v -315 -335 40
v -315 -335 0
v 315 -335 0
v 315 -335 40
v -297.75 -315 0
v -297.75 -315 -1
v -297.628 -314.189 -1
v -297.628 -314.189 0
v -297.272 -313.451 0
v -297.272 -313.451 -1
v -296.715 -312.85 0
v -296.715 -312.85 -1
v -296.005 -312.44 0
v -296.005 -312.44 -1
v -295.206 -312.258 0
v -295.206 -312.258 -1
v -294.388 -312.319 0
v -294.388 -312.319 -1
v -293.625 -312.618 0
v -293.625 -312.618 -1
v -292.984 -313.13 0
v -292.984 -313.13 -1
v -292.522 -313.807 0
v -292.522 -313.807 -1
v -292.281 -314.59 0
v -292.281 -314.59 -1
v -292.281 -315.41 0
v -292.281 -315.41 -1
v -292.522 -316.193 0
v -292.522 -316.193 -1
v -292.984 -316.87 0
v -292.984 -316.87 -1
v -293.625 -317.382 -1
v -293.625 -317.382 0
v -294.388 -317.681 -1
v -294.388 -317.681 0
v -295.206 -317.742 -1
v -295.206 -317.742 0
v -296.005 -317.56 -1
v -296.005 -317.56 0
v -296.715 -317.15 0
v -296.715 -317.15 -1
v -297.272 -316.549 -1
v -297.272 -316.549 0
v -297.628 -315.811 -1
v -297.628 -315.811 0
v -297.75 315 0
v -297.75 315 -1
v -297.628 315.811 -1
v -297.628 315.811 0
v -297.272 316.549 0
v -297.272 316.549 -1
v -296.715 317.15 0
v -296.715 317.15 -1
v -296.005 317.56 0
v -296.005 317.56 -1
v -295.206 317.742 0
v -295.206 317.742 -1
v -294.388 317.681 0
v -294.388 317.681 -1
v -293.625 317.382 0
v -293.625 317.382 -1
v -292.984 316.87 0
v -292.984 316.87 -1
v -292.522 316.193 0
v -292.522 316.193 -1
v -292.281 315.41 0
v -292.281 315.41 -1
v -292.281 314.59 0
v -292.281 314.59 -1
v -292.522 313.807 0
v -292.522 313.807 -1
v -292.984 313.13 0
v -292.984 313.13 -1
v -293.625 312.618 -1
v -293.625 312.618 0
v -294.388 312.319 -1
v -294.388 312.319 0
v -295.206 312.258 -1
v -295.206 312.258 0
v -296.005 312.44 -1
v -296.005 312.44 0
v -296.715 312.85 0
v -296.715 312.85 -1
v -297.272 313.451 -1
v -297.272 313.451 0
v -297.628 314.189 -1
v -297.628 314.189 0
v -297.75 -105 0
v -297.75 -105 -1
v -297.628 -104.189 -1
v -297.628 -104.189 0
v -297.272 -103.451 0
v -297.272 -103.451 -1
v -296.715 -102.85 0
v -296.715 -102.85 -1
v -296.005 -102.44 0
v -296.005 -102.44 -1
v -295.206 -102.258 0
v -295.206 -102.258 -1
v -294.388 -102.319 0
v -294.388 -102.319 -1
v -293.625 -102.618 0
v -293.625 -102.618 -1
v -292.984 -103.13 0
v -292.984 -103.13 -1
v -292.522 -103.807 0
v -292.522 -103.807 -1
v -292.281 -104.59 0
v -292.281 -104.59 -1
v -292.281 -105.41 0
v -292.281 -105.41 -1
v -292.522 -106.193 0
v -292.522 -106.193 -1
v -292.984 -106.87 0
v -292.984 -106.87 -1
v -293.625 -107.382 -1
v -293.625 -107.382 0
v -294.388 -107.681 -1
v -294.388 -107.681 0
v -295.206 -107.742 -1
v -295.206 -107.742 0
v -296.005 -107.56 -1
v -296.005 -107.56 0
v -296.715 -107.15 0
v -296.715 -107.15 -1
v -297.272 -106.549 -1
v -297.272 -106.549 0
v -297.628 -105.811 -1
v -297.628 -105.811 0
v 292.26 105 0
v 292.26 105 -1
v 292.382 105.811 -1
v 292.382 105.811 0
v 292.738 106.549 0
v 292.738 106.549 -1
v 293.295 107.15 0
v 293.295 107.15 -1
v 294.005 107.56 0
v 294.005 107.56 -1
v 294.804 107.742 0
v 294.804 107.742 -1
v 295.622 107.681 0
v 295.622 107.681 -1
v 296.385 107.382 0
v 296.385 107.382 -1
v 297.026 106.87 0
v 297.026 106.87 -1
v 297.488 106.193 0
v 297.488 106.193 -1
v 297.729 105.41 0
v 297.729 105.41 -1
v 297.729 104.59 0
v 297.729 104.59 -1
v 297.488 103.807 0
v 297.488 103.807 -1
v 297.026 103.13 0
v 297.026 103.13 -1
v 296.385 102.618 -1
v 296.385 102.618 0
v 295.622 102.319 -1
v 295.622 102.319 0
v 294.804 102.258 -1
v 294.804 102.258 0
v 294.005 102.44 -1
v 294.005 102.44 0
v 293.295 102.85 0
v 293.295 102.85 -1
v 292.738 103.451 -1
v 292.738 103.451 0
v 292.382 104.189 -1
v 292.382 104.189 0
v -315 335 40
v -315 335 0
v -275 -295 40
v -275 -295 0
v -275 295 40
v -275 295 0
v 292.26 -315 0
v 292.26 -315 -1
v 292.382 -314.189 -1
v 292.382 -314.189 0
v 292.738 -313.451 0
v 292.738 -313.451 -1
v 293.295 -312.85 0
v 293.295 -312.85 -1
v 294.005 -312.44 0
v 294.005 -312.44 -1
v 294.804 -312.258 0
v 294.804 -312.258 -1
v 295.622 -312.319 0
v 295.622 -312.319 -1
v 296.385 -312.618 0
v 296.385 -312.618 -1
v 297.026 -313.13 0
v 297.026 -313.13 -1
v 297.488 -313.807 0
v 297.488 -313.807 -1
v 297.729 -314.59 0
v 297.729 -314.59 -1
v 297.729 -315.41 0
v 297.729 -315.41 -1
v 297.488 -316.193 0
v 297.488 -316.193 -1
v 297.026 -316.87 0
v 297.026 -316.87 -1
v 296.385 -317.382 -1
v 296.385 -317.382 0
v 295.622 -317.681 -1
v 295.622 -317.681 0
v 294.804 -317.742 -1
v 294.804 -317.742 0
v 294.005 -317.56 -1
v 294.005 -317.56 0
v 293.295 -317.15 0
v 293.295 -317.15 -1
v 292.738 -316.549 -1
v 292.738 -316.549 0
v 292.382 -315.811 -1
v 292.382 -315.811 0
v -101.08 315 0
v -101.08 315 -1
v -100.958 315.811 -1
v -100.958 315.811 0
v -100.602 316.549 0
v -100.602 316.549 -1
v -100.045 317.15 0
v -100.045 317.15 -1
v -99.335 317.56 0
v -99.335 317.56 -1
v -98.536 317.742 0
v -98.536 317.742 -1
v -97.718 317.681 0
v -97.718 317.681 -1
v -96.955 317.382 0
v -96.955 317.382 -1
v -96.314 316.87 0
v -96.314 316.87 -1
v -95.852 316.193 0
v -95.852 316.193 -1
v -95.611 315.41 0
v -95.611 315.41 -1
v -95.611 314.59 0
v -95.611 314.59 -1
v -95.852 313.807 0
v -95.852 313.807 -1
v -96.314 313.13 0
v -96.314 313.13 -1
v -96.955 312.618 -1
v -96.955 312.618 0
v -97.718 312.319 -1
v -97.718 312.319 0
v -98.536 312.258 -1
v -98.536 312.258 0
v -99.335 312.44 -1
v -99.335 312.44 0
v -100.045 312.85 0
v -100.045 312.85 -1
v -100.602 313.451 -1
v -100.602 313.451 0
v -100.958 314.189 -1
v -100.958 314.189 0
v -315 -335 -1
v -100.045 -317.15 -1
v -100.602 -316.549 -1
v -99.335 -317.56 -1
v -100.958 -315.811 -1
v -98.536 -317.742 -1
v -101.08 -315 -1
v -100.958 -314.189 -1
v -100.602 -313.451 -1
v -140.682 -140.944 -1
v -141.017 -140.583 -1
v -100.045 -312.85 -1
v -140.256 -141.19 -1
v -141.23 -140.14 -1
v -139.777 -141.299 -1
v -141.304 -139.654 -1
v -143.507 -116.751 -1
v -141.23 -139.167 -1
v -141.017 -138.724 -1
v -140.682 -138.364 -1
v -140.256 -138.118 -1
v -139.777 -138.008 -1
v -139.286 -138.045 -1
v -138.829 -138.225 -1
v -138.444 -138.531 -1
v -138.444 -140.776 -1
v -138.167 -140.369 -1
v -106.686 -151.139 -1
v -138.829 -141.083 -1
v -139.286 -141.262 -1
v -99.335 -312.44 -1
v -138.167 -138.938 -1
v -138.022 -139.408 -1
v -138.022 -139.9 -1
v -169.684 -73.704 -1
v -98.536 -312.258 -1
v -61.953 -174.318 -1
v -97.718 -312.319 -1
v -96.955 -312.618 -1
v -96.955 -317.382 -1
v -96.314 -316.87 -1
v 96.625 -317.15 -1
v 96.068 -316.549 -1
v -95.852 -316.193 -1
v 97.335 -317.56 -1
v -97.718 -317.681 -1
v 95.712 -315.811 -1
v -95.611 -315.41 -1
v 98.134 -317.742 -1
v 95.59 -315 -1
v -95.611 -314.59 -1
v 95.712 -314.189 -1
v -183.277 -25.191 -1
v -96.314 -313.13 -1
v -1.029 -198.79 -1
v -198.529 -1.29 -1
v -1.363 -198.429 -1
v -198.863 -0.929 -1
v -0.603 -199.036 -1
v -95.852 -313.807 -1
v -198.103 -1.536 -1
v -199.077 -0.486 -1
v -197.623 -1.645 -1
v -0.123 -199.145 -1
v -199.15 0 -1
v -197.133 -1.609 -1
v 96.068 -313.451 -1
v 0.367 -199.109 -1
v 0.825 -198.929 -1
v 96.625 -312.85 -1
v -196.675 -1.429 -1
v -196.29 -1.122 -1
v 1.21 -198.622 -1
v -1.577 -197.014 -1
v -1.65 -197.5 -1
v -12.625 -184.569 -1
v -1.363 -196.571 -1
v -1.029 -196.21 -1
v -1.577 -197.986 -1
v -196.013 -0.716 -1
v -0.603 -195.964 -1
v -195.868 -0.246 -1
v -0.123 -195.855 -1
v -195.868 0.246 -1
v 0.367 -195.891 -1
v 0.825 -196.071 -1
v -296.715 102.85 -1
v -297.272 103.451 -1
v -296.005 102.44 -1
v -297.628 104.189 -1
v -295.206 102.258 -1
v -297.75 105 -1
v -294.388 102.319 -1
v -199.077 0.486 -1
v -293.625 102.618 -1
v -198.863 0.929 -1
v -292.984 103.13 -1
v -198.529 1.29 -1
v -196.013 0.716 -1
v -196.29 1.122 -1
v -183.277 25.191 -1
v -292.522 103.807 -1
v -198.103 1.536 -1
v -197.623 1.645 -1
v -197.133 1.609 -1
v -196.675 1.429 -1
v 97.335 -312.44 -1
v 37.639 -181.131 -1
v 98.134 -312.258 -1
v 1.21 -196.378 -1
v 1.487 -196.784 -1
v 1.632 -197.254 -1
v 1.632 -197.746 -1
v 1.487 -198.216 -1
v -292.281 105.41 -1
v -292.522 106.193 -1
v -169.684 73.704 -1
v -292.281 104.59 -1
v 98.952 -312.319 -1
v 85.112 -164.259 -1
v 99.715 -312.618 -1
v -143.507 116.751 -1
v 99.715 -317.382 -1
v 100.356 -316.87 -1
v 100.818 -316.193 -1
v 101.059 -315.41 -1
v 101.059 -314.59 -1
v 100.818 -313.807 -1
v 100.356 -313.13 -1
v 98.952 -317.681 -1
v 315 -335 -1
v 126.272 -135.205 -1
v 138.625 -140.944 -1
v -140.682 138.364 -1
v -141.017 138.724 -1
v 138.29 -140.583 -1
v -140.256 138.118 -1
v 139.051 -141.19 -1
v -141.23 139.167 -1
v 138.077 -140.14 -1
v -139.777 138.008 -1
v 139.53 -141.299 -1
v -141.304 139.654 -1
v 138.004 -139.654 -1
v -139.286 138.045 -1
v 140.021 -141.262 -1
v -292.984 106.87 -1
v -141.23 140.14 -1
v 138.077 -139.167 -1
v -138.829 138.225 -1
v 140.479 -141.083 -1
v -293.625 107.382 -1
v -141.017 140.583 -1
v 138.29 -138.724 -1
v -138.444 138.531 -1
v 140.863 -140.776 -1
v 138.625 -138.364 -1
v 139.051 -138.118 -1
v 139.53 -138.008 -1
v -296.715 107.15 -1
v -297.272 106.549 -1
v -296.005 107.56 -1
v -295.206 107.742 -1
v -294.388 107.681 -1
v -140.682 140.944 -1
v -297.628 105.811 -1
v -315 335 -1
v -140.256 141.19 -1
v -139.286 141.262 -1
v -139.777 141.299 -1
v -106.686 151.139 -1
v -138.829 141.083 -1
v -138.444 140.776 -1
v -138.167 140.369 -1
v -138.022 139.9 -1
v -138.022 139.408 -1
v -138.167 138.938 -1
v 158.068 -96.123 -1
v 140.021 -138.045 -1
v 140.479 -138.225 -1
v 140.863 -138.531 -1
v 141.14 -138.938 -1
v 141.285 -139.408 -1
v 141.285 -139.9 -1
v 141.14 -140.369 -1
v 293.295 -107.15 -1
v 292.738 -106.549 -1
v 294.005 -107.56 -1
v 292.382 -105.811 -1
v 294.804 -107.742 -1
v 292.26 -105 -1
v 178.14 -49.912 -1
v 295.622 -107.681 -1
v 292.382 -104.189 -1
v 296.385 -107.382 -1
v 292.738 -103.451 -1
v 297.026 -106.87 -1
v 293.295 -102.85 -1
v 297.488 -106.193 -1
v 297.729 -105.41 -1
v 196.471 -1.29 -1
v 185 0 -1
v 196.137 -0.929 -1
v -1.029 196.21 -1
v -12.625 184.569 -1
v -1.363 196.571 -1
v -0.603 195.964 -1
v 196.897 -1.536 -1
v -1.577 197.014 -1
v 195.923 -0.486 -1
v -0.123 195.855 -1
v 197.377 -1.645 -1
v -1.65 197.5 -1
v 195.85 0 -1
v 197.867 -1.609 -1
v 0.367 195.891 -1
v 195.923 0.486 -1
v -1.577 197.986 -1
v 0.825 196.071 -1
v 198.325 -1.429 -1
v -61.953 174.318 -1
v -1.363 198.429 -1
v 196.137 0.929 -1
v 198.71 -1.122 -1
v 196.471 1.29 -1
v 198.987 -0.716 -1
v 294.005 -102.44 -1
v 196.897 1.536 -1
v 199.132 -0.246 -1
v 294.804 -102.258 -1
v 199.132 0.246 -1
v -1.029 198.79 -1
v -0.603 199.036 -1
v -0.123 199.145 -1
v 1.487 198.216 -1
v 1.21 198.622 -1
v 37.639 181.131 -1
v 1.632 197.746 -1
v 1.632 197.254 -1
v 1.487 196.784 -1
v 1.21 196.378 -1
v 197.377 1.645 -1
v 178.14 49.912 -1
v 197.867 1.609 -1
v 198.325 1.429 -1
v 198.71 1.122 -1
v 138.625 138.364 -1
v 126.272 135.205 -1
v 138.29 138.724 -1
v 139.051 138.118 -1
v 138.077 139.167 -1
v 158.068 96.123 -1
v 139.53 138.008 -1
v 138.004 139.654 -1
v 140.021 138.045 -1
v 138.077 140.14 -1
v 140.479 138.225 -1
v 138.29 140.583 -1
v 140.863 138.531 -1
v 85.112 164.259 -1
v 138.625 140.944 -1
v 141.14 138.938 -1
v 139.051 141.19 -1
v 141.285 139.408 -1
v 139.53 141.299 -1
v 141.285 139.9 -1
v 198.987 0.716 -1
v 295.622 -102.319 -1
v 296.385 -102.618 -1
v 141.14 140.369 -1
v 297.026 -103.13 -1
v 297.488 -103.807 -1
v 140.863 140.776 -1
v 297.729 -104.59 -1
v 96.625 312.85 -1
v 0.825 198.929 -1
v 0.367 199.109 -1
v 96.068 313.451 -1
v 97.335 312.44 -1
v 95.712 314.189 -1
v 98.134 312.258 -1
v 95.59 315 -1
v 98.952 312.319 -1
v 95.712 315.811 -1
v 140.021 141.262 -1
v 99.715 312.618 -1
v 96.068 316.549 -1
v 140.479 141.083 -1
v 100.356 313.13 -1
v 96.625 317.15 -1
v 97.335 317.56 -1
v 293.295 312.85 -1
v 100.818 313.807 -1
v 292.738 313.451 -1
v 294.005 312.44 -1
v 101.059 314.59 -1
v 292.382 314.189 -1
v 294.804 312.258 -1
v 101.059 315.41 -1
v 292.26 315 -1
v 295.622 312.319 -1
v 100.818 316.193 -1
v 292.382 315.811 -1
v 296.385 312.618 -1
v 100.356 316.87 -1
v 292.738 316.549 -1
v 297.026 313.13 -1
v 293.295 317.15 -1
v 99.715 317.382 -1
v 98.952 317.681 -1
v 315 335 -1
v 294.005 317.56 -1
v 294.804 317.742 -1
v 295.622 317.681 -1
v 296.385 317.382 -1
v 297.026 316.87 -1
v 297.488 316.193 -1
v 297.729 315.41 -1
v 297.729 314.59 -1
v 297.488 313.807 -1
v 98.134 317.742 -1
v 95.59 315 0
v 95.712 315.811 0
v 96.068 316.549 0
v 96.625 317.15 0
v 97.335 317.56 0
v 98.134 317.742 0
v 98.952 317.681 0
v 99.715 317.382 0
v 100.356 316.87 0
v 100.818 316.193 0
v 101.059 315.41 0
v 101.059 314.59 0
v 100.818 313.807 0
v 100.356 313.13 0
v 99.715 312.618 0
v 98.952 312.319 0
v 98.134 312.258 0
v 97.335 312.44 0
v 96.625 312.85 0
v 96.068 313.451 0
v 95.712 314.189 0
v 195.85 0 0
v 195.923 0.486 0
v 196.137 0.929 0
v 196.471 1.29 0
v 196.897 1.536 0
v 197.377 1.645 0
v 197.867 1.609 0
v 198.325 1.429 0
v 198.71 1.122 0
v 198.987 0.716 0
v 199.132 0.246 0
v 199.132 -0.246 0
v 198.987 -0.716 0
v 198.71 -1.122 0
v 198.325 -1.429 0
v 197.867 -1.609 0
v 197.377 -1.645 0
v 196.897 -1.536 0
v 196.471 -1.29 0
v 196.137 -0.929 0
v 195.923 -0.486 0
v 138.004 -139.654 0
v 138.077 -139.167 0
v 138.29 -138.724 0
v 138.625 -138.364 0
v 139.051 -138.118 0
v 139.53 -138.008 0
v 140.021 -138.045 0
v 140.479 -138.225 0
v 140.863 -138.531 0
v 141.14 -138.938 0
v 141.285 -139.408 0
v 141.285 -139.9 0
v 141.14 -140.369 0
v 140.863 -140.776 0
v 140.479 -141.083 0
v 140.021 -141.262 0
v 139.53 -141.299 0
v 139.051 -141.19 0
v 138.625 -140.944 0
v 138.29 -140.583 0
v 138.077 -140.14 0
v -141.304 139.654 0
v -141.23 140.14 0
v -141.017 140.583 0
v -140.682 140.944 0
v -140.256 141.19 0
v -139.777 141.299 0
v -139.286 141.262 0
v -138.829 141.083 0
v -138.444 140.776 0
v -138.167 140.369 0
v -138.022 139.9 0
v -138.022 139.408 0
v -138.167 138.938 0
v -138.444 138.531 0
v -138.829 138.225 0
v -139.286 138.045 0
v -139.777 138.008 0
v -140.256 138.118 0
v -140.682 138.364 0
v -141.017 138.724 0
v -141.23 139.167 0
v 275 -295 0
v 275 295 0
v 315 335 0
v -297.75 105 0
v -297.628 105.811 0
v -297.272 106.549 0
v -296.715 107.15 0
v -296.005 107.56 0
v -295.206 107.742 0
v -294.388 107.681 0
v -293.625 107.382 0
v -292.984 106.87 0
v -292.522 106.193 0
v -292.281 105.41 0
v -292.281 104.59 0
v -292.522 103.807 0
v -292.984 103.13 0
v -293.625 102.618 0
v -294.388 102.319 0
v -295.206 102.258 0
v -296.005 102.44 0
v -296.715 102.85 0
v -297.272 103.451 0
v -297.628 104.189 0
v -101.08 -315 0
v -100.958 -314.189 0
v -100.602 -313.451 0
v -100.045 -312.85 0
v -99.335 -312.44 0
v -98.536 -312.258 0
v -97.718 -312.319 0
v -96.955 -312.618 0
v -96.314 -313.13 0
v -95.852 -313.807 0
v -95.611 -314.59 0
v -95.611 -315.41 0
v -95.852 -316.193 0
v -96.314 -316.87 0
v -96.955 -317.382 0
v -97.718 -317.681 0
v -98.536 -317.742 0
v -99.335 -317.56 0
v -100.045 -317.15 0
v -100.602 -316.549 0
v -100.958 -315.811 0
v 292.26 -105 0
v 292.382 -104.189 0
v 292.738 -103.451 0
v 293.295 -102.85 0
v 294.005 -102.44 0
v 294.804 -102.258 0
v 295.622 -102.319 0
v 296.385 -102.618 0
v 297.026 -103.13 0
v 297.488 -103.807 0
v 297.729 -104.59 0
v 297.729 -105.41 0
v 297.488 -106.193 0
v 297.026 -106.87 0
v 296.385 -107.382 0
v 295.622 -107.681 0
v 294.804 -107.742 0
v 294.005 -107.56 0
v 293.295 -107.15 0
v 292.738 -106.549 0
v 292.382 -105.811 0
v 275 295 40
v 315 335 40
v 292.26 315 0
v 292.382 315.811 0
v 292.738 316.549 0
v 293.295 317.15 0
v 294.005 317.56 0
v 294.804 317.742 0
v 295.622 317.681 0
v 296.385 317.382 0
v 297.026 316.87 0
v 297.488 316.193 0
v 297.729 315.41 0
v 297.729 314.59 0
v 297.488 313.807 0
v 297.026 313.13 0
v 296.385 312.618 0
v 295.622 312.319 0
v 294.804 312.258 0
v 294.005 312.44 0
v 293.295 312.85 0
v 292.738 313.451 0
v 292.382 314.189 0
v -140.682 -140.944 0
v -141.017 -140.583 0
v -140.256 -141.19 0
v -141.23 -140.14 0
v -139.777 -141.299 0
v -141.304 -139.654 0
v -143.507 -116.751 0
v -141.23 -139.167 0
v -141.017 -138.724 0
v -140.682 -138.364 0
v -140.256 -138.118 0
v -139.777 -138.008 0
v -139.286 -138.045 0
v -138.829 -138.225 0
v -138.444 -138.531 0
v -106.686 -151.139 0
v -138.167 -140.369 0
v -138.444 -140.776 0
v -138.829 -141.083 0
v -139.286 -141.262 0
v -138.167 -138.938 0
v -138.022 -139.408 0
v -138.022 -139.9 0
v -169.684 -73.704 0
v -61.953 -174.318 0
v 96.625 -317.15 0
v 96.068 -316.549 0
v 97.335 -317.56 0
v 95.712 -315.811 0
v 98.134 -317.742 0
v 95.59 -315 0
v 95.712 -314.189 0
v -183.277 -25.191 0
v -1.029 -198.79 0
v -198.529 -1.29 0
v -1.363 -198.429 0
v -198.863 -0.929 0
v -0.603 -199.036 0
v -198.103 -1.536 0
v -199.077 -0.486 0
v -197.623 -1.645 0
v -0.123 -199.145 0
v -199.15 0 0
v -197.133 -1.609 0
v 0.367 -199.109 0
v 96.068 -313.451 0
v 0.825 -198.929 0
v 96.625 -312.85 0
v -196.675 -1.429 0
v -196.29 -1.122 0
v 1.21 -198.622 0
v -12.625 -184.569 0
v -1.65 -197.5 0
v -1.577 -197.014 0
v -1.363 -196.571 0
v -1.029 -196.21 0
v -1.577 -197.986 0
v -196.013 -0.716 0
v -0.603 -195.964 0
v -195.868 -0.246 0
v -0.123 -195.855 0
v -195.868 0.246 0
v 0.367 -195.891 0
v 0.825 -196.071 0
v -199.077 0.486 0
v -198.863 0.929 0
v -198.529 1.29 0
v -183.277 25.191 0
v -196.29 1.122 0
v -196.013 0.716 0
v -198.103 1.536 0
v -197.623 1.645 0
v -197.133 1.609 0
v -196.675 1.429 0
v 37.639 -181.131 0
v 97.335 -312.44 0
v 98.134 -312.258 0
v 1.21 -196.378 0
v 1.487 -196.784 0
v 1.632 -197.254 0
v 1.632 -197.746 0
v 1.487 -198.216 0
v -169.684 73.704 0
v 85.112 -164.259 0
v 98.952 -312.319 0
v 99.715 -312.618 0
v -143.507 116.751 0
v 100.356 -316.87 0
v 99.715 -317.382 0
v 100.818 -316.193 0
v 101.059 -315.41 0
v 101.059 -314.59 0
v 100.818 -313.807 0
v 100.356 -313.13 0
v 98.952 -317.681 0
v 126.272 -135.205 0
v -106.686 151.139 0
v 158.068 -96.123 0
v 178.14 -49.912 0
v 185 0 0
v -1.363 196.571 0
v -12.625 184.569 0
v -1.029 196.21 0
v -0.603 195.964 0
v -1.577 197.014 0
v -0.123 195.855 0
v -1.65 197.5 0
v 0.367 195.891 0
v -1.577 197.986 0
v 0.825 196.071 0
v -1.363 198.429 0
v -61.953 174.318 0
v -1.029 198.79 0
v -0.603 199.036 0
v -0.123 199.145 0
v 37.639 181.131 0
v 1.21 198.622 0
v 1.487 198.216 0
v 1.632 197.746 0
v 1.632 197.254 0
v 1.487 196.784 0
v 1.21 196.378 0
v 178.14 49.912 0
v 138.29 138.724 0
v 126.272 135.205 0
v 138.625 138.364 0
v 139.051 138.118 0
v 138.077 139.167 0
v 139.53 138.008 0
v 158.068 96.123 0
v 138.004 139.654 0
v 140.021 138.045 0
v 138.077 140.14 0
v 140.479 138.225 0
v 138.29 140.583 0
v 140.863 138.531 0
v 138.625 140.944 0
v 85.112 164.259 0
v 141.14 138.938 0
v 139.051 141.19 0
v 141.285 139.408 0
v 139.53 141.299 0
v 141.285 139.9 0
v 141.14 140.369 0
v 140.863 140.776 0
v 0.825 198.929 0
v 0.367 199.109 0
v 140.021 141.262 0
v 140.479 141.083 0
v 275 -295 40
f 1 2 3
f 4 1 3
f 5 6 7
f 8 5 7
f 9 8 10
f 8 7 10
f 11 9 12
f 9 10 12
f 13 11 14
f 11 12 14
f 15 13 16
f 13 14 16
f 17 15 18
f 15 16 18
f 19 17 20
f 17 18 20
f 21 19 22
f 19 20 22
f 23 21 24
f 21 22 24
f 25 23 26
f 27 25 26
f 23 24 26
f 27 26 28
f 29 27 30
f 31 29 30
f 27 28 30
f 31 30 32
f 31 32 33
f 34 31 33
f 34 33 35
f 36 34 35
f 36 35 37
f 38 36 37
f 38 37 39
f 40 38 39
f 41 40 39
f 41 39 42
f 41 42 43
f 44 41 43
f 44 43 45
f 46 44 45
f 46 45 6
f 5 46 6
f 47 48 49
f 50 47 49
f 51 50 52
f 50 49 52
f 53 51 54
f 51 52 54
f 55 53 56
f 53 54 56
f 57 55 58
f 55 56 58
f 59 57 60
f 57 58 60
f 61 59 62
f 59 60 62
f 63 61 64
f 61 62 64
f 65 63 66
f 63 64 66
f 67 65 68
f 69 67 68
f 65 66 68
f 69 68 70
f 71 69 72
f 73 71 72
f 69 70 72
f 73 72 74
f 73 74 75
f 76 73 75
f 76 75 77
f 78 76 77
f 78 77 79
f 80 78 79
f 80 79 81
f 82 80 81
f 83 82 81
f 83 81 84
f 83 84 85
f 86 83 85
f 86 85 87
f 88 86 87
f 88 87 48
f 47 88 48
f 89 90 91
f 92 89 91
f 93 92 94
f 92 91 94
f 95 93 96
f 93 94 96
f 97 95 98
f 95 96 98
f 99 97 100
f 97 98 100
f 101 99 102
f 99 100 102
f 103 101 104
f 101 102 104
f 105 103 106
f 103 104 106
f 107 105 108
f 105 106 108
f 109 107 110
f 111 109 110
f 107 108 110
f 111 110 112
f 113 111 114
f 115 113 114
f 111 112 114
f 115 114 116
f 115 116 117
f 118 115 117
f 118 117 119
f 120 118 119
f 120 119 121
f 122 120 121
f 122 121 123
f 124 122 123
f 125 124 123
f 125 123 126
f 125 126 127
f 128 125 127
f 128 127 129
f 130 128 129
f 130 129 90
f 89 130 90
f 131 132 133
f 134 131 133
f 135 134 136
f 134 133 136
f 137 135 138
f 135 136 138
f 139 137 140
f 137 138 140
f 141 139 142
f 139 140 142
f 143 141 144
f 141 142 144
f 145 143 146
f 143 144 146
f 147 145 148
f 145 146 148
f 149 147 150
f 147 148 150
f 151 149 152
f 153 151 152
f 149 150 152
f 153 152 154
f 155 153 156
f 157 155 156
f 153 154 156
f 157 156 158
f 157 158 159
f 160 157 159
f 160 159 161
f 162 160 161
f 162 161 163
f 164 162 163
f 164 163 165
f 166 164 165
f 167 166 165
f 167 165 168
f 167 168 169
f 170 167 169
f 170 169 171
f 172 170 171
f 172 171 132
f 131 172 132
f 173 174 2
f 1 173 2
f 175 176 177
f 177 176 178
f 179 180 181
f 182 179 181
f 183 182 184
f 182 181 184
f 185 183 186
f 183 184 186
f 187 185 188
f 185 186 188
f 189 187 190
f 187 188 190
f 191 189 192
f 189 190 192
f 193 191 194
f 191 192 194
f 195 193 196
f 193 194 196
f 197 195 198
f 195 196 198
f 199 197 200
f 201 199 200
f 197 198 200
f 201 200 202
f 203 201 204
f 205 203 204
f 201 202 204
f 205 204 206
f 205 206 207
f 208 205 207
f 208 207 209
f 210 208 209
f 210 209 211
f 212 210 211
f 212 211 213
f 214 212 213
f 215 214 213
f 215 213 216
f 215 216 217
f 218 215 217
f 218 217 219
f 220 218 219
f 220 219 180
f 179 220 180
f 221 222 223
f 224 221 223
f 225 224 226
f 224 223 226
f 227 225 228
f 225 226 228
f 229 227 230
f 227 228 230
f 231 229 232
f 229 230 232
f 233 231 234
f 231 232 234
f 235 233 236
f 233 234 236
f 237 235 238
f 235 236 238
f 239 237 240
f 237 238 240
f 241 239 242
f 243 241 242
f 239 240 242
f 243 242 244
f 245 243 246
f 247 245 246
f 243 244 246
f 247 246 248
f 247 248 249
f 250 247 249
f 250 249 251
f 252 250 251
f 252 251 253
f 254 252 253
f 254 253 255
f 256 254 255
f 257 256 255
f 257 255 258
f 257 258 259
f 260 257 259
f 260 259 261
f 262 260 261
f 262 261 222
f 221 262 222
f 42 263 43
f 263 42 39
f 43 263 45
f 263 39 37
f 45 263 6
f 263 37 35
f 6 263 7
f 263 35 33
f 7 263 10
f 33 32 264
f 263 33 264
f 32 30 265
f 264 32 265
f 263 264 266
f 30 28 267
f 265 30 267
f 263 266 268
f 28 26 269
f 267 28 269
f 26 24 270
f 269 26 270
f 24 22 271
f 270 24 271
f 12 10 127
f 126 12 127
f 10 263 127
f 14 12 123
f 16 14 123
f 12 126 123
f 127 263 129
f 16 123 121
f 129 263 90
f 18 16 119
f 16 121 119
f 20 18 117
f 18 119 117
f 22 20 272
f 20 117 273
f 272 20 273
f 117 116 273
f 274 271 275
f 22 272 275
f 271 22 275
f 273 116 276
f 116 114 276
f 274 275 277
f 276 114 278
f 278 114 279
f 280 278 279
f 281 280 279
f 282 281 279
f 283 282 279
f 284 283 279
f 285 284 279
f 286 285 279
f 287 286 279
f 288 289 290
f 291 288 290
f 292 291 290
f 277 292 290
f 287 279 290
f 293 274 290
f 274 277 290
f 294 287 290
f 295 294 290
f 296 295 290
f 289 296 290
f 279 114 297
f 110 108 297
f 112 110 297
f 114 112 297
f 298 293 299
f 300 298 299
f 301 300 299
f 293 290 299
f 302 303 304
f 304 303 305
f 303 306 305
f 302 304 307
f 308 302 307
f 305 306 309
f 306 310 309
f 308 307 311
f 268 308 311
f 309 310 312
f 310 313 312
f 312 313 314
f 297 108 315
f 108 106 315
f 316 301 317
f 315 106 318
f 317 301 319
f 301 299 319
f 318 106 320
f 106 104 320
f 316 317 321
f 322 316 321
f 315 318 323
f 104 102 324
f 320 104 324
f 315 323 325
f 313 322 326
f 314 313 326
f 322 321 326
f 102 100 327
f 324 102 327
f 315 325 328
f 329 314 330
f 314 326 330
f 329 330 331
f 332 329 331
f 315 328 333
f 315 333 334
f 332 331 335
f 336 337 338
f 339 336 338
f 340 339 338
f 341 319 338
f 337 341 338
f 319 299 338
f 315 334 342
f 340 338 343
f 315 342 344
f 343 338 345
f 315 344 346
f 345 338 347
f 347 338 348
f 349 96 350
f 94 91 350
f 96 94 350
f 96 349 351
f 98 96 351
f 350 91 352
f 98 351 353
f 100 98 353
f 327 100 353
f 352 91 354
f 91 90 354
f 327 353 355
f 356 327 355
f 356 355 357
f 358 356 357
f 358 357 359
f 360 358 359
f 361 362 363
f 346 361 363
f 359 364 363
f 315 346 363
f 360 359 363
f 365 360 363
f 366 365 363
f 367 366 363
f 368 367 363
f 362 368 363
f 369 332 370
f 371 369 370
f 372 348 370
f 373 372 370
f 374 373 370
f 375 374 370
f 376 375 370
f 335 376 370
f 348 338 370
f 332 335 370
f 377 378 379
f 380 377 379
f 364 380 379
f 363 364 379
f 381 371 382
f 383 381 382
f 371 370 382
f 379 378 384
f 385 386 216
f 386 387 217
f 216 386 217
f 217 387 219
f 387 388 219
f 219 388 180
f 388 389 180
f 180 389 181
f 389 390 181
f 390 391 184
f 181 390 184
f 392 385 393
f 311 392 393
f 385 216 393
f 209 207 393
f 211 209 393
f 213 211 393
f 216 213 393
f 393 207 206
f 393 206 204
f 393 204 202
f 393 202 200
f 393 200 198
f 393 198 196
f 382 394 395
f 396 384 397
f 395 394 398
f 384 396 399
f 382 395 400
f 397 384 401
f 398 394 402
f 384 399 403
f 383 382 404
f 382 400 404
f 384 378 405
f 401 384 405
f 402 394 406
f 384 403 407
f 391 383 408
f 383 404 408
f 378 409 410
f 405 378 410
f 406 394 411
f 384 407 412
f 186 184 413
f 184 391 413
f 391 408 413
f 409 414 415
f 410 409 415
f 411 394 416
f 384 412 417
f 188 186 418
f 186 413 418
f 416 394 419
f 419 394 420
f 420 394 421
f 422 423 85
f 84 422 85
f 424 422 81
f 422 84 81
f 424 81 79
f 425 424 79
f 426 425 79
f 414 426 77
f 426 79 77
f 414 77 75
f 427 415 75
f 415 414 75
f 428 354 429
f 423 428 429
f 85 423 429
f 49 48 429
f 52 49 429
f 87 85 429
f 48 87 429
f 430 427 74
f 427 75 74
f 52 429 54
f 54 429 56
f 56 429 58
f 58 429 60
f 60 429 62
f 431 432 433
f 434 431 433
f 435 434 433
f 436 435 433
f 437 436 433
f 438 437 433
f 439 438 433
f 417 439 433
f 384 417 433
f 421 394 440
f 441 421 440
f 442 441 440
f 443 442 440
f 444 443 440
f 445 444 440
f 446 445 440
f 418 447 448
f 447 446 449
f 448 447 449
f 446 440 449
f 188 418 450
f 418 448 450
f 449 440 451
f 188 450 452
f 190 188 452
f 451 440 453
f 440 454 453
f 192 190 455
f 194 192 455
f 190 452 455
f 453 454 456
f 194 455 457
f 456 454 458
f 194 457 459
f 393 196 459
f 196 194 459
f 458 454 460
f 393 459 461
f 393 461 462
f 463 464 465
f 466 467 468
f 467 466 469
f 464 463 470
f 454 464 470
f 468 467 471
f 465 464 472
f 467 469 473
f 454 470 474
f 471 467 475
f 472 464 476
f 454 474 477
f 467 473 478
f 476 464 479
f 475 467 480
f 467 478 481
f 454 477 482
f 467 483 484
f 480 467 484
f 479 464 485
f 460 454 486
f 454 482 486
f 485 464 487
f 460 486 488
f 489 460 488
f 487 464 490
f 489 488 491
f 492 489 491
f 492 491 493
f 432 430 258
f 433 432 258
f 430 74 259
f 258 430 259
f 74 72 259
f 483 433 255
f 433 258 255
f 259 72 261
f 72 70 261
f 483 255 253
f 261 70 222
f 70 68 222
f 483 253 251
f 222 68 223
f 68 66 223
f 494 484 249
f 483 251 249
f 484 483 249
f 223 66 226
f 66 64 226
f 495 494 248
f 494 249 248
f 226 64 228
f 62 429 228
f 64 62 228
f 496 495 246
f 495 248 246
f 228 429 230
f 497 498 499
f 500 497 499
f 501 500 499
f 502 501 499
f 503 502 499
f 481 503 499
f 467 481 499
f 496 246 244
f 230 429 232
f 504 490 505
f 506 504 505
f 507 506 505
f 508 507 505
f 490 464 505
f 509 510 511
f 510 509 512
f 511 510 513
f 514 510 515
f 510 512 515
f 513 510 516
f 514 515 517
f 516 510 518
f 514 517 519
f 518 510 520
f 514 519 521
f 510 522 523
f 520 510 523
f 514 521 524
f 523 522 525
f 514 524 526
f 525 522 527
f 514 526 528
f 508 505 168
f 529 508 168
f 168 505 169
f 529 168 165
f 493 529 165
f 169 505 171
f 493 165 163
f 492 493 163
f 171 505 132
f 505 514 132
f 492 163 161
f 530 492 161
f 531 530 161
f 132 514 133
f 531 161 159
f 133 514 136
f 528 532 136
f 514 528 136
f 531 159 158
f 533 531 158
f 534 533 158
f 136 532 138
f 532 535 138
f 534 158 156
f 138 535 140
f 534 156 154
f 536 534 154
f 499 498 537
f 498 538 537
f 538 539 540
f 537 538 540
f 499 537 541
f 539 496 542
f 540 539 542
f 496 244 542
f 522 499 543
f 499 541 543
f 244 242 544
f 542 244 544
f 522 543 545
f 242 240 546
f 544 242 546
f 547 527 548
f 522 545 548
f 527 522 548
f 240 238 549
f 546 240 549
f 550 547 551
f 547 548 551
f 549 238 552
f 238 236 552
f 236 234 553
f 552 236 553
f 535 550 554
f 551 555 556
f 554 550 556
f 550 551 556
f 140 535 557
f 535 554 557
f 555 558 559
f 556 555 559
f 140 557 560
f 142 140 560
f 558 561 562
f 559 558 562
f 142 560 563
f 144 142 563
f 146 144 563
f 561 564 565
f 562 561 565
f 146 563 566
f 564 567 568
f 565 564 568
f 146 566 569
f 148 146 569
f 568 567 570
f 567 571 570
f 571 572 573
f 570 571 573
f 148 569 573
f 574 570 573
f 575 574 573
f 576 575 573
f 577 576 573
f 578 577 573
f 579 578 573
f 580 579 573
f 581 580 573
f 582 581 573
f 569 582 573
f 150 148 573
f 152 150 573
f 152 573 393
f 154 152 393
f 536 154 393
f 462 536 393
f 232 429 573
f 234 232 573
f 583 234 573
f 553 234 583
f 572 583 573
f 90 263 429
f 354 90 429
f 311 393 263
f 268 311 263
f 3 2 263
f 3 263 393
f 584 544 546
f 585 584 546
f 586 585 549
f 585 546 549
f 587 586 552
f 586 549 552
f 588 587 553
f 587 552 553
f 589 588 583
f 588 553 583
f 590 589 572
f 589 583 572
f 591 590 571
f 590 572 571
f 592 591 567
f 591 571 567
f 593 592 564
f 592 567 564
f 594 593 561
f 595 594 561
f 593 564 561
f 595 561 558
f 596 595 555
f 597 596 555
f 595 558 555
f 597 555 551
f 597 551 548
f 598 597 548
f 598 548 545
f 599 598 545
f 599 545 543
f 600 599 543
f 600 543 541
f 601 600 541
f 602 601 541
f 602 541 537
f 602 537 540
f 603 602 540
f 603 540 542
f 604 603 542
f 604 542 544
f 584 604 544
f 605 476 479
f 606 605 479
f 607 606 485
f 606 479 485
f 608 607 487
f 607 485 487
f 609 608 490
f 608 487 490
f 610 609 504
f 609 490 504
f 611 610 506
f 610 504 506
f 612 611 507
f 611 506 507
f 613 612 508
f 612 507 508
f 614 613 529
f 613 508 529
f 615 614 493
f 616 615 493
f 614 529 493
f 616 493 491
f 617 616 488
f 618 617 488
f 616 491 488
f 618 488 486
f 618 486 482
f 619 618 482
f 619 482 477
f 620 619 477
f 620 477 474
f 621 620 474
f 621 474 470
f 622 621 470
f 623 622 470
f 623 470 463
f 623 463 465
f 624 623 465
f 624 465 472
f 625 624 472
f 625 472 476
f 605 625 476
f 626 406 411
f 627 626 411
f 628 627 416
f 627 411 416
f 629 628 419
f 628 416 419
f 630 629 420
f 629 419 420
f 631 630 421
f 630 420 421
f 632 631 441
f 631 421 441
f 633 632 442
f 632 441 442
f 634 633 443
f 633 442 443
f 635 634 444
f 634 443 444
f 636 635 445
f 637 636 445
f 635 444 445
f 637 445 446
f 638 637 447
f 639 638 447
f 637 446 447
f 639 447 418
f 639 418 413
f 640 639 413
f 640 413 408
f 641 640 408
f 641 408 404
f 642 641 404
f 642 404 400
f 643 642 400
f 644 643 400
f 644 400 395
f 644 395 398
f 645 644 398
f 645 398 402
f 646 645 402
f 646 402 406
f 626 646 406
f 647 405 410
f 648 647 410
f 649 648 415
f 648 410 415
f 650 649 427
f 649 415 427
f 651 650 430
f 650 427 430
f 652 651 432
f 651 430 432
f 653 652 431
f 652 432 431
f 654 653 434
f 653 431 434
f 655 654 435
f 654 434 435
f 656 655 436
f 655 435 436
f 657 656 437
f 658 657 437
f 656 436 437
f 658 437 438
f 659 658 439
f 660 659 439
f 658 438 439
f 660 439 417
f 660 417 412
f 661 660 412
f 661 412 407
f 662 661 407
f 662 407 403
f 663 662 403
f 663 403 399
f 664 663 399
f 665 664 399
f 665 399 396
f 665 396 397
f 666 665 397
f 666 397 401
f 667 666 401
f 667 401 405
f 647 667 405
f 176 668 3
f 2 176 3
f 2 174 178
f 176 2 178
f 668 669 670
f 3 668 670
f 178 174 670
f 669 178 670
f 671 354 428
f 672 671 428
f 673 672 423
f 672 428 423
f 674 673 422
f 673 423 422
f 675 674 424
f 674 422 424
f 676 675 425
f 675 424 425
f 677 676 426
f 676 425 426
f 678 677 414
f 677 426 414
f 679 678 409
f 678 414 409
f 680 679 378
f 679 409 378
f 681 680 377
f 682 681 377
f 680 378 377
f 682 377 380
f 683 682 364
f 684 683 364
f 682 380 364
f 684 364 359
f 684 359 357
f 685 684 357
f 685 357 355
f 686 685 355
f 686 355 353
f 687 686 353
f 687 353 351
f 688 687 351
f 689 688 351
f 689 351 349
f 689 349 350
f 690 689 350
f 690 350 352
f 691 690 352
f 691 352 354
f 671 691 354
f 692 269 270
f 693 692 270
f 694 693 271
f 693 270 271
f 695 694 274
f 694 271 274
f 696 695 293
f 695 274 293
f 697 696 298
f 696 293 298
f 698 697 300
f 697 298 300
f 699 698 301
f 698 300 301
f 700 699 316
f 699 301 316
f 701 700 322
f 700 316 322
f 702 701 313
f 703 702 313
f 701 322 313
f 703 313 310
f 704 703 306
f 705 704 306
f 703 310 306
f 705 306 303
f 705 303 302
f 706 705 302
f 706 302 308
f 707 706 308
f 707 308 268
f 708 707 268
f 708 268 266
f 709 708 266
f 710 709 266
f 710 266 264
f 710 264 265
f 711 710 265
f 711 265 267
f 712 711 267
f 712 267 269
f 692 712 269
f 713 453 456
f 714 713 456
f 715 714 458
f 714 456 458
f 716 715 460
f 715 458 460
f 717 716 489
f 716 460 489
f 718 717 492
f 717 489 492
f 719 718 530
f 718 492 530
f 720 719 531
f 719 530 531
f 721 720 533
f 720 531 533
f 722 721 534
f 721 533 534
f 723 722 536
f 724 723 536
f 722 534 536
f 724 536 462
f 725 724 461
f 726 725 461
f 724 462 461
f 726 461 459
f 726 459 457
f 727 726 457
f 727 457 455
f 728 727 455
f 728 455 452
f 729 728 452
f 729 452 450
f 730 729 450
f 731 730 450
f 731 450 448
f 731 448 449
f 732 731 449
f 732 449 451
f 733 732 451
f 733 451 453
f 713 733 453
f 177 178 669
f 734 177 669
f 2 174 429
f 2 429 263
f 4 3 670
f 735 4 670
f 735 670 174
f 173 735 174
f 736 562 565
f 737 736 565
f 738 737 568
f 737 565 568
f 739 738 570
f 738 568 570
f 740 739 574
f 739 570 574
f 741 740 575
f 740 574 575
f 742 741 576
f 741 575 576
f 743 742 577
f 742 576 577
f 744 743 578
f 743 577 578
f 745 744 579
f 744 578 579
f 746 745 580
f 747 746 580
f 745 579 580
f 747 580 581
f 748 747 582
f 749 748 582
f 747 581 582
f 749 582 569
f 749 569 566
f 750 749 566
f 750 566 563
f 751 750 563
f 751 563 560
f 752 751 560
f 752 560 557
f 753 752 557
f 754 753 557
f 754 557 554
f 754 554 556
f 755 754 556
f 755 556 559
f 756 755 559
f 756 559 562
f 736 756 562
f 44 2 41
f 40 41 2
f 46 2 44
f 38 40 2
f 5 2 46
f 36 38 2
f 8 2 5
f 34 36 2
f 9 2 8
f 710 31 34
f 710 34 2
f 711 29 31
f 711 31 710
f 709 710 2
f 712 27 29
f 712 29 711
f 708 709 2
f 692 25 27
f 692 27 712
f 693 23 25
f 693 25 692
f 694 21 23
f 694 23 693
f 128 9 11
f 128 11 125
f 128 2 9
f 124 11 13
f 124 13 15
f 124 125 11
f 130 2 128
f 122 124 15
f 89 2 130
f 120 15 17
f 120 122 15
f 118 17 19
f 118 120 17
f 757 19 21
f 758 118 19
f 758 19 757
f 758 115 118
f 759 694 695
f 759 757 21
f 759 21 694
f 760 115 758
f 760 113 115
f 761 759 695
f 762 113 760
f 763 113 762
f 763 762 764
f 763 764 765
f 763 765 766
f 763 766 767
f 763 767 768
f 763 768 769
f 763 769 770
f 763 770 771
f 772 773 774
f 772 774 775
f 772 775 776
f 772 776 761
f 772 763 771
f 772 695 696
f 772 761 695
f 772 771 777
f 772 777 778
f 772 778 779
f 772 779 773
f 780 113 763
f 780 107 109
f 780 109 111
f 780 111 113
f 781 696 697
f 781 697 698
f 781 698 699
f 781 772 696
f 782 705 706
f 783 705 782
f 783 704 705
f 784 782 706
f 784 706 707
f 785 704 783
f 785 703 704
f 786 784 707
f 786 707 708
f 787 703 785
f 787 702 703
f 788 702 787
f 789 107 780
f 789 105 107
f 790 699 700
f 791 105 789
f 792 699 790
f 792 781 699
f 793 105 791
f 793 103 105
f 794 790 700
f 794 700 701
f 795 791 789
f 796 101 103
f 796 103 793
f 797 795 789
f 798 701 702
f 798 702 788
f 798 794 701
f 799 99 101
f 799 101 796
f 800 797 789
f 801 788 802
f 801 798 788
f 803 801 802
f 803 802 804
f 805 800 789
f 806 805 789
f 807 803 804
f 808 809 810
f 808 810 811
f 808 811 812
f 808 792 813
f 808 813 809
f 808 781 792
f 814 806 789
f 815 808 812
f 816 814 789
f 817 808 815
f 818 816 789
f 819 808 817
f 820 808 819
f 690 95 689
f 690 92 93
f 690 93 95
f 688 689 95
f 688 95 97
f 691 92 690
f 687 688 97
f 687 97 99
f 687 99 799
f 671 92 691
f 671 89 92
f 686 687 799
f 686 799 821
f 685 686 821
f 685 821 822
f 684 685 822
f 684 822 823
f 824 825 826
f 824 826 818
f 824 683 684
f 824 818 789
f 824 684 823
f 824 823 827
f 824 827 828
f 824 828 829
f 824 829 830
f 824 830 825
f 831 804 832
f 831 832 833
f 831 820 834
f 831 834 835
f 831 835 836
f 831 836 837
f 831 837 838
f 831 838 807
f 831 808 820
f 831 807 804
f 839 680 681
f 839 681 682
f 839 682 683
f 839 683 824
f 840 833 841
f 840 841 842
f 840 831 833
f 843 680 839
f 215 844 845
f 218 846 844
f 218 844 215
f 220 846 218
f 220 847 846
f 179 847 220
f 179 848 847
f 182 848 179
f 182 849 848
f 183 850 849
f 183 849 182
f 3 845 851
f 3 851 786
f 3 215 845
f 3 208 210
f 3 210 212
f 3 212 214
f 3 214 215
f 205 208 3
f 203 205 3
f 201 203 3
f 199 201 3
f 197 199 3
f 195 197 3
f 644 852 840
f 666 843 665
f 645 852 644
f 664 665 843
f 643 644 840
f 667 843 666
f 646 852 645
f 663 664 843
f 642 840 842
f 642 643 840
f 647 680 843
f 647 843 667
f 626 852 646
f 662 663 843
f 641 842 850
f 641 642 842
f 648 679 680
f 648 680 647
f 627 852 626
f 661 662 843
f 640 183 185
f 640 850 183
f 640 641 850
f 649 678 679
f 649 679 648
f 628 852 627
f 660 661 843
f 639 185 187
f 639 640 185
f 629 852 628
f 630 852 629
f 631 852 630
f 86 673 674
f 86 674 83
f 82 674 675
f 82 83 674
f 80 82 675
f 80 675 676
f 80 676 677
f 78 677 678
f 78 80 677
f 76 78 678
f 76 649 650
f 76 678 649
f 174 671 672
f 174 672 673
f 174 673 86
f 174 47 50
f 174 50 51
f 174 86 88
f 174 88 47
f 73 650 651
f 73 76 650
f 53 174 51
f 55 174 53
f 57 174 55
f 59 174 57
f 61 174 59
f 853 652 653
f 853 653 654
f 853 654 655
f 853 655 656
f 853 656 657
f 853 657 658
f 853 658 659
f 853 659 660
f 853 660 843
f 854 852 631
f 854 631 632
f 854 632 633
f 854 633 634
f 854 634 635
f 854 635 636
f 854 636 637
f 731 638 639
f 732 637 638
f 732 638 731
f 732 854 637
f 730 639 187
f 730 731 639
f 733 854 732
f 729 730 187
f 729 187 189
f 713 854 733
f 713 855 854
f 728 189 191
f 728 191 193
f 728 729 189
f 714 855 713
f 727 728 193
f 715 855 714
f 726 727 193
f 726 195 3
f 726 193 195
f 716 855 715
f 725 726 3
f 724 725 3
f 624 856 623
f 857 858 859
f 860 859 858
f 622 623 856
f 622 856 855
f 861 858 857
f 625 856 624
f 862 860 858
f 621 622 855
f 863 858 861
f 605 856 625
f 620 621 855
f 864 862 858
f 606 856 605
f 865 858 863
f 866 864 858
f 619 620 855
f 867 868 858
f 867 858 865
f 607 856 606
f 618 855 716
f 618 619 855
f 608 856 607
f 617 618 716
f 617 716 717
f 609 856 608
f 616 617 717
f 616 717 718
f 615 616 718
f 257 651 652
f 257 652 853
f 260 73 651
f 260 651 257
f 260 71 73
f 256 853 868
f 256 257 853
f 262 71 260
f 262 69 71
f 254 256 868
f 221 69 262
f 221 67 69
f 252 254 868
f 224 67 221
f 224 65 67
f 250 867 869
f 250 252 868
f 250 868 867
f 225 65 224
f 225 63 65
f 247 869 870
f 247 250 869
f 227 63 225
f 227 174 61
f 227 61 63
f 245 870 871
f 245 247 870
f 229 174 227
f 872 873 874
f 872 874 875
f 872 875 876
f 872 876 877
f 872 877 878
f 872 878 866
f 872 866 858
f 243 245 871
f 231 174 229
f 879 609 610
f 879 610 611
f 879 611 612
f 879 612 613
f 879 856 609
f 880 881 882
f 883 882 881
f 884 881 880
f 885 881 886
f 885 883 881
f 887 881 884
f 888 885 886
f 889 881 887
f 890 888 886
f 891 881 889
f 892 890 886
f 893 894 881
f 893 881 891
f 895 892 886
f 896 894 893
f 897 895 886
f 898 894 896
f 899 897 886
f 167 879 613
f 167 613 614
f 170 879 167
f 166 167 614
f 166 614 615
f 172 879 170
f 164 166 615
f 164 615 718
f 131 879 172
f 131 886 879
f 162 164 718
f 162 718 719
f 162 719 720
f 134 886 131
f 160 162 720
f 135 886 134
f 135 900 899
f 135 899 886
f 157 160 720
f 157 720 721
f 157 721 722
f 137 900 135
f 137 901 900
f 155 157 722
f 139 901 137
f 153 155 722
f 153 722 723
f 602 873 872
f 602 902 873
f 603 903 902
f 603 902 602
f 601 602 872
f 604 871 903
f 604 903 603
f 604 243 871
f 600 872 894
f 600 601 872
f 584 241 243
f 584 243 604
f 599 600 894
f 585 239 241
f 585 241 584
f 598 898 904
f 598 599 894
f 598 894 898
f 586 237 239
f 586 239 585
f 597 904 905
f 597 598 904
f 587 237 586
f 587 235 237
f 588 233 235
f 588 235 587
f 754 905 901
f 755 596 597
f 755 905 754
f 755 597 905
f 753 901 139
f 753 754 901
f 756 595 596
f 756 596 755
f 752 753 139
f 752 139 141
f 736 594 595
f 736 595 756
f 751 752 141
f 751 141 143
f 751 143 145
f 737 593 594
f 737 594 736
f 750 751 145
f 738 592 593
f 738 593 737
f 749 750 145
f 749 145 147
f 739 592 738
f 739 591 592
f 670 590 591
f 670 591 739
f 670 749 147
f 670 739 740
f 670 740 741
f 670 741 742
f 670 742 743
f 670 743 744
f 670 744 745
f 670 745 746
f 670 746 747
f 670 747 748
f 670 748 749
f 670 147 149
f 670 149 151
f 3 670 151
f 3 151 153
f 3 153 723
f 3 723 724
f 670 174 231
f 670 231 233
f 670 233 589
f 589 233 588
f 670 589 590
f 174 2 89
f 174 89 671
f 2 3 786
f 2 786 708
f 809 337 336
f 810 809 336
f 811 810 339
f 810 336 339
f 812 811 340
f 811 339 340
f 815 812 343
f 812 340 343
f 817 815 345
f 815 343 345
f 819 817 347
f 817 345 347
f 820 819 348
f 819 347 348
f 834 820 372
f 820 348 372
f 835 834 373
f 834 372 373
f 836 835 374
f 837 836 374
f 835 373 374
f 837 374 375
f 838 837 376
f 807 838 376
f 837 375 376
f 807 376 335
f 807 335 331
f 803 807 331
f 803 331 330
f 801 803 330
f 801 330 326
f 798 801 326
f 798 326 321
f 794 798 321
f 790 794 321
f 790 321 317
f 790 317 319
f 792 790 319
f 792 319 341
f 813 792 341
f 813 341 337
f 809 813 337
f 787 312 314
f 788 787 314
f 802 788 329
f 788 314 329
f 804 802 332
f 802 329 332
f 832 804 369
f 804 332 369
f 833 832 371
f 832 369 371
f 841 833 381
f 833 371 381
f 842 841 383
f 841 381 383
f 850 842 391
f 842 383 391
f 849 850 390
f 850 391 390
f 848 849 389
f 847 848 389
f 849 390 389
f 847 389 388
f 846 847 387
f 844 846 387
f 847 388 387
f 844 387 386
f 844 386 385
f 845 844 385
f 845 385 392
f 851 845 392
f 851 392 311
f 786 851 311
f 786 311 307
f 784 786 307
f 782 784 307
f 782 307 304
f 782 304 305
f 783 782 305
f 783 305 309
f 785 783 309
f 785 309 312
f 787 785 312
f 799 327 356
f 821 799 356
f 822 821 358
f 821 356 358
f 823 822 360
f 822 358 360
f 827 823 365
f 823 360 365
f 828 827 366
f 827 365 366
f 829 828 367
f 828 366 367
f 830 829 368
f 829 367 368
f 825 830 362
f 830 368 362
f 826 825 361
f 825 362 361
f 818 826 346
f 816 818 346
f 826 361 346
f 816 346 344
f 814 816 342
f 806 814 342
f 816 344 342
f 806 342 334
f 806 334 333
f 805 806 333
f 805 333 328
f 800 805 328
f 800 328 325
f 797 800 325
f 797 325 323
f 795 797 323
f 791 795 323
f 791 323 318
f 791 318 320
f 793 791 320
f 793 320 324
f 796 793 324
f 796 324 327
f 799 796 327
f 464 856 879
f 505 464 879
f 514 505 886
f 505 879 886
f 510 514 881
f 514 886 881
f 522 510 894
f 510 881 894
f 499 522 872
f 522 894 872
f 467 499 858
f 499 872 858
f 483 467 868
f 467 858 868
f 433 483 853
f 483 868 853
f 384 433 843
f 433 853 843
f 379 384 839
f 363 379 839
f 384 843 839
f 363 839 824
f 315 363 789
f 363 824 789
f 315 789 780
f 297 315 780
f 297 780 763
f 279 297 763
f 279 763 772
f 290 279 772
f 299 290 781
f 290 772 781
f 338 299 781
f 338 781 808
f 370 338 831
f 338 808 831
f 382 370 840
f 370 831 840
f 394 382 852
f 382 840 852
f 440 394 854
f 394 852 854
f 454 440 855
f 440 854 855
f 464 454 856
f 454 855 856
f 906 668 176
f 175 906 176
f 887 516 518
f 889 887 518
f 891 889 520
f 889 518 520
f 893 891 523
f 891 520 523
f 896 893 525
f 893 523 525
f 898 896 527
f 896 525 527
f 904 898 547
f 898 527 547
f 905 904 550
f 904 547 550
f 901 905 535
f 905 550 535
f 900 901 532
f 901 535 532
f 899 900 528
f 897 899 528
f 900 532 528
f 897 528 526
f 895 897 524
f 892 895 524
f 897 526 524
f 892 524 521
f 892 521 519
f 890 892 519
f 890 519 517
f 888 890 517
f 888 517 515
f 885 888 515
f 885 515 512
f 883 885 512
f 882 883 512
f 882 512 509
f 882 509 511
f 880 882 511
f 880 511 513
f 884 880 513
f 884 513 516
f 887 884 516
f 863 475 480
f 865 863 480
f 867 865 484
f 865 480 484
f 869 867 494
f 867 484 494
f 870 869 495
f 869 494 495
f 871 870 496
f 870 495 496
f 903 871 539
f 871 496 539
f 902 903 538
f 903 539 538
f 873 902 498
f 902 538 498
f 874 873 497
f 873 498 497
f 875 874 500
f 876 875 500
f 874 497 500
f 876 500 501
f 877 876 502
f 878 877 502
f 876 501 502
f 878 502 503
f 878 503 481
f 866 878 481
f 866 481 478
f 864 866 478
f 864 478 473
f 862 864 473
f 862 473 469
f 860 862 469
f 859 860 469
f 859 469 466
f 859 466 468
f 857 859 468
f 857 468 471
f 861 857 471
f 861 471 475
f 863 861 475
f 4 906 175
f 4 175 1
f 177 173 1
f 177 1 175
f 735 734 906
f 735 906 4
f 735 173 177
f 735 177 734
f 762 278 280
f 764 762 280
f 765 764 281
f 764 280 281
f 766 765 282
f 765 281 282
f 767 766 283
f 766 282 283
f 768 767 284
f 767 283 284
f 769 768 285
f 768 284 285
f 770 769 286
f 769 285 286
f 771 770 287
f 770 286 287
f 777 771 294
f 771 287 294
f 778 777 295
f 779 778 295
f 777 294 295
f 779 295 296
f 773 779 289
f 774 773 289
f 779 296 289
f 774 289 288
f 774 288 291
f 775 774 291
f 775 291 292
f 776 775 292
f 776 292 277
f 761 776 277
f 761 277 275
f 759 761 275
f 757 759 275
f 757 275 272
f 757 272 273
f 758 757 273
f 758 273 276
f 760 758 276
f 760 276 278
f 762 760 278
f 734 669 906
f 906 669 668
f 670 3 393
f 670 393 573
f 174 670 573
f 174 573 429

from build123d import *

# Parameters (mm, degrees)
F1_DEPTH = 40
F0_R     = 185
F2_DEPTH = 1
F3_D     = 3.3
F3_DEPTH = 50
F3_TIP   = 0.9914200214
F4_D     = 5.5


# Not quite as in the source:
# - a feature names something its author has since deleted; it is built from what else it names


with BuildPart() as f1:
    # F0 (on Top) → F1 (new body)
    with BuildSketch(Plane.XY):
        Polygon((-275, -295), (-275, 295), (-275, 335), (-315, 335), (-315, -335), (-275, -335), align=None)
        Polygon((-275, 295), (-24.79, 295), (275, 295), (275, 335), (-275, 335), align=None)
        Polygon((275, 335), (275, 295), (275, -295), (275, -325), (275, -335), (315, -335), (315, 335), align=None)
        Polygon((275, -325), (275, -295), (-275, -295), (-275, -335), (0, -335), (275, -335), align=None)
    extrude(amount=F1_DEPTH)


with BuildPart() as f2:
    # F0 (on Top) → F2 (new body)
    with BuildSketch(Plane.XY):
        Polygon((275, 295), (-24.79, 295), (-275, 295), (-275, -295), (275, -295), align=None)
        Circle(F0_R, mode=Mode.SUBTRACT)
        Polygon((-275, 295), (-24.79, 295), (275, 295), (275, 335), (-275, 335), align=None)
        Polygon((275, 335), (275, 295), (275, -295), (275, -325), (275, -335), (315, -335), (315, 335), align=None)
        Polygon((-275, -295), (-275, 295), (-275, 335), (-315, 335), (-315, -335), (-275, -335), align=None)
        Polygon((275, -325), (275, -295), (-275, -295), (-275, -335), (0, -335), (275, -335), align=None)
    extrude(amount=-F2_DEPTH)

    # F3
    with Locations(Plane.XY):
        with Locations((0, 197.5), (139.6535892843, 139.6535892843), (197.5, 0), (139.6535892843, -139.6535892843), (0, -197.5), (-139.6535892843, -139.6535892843), (-139.6535892843, 139.6535892843), (-197.5, 0)):
            Hole(F3_D / 2, depth=F3_DEPTH)
            with Locations((0, 0, -(F3_DEPTH + F3_TIP / 2))):  # 118° drill point
                Cone(0, F3_D / 2, F3_TIP, mode=Mode.SUBTRACT)

    # F4 (through all)
    with Locations(Plane.XY):
        with Locations((295.01, -315), (295.01, -105), (295.01, 105), (295.01, 315), (98.34, 315), (-98.33, 315), (-295, 315), (-295, 105), (-295, -105), (-295, -315), (-98.33, -315), (98.34, -315)):
            Hole(F4_D / 2)


solid = Compound([f1.part, f2.part])
